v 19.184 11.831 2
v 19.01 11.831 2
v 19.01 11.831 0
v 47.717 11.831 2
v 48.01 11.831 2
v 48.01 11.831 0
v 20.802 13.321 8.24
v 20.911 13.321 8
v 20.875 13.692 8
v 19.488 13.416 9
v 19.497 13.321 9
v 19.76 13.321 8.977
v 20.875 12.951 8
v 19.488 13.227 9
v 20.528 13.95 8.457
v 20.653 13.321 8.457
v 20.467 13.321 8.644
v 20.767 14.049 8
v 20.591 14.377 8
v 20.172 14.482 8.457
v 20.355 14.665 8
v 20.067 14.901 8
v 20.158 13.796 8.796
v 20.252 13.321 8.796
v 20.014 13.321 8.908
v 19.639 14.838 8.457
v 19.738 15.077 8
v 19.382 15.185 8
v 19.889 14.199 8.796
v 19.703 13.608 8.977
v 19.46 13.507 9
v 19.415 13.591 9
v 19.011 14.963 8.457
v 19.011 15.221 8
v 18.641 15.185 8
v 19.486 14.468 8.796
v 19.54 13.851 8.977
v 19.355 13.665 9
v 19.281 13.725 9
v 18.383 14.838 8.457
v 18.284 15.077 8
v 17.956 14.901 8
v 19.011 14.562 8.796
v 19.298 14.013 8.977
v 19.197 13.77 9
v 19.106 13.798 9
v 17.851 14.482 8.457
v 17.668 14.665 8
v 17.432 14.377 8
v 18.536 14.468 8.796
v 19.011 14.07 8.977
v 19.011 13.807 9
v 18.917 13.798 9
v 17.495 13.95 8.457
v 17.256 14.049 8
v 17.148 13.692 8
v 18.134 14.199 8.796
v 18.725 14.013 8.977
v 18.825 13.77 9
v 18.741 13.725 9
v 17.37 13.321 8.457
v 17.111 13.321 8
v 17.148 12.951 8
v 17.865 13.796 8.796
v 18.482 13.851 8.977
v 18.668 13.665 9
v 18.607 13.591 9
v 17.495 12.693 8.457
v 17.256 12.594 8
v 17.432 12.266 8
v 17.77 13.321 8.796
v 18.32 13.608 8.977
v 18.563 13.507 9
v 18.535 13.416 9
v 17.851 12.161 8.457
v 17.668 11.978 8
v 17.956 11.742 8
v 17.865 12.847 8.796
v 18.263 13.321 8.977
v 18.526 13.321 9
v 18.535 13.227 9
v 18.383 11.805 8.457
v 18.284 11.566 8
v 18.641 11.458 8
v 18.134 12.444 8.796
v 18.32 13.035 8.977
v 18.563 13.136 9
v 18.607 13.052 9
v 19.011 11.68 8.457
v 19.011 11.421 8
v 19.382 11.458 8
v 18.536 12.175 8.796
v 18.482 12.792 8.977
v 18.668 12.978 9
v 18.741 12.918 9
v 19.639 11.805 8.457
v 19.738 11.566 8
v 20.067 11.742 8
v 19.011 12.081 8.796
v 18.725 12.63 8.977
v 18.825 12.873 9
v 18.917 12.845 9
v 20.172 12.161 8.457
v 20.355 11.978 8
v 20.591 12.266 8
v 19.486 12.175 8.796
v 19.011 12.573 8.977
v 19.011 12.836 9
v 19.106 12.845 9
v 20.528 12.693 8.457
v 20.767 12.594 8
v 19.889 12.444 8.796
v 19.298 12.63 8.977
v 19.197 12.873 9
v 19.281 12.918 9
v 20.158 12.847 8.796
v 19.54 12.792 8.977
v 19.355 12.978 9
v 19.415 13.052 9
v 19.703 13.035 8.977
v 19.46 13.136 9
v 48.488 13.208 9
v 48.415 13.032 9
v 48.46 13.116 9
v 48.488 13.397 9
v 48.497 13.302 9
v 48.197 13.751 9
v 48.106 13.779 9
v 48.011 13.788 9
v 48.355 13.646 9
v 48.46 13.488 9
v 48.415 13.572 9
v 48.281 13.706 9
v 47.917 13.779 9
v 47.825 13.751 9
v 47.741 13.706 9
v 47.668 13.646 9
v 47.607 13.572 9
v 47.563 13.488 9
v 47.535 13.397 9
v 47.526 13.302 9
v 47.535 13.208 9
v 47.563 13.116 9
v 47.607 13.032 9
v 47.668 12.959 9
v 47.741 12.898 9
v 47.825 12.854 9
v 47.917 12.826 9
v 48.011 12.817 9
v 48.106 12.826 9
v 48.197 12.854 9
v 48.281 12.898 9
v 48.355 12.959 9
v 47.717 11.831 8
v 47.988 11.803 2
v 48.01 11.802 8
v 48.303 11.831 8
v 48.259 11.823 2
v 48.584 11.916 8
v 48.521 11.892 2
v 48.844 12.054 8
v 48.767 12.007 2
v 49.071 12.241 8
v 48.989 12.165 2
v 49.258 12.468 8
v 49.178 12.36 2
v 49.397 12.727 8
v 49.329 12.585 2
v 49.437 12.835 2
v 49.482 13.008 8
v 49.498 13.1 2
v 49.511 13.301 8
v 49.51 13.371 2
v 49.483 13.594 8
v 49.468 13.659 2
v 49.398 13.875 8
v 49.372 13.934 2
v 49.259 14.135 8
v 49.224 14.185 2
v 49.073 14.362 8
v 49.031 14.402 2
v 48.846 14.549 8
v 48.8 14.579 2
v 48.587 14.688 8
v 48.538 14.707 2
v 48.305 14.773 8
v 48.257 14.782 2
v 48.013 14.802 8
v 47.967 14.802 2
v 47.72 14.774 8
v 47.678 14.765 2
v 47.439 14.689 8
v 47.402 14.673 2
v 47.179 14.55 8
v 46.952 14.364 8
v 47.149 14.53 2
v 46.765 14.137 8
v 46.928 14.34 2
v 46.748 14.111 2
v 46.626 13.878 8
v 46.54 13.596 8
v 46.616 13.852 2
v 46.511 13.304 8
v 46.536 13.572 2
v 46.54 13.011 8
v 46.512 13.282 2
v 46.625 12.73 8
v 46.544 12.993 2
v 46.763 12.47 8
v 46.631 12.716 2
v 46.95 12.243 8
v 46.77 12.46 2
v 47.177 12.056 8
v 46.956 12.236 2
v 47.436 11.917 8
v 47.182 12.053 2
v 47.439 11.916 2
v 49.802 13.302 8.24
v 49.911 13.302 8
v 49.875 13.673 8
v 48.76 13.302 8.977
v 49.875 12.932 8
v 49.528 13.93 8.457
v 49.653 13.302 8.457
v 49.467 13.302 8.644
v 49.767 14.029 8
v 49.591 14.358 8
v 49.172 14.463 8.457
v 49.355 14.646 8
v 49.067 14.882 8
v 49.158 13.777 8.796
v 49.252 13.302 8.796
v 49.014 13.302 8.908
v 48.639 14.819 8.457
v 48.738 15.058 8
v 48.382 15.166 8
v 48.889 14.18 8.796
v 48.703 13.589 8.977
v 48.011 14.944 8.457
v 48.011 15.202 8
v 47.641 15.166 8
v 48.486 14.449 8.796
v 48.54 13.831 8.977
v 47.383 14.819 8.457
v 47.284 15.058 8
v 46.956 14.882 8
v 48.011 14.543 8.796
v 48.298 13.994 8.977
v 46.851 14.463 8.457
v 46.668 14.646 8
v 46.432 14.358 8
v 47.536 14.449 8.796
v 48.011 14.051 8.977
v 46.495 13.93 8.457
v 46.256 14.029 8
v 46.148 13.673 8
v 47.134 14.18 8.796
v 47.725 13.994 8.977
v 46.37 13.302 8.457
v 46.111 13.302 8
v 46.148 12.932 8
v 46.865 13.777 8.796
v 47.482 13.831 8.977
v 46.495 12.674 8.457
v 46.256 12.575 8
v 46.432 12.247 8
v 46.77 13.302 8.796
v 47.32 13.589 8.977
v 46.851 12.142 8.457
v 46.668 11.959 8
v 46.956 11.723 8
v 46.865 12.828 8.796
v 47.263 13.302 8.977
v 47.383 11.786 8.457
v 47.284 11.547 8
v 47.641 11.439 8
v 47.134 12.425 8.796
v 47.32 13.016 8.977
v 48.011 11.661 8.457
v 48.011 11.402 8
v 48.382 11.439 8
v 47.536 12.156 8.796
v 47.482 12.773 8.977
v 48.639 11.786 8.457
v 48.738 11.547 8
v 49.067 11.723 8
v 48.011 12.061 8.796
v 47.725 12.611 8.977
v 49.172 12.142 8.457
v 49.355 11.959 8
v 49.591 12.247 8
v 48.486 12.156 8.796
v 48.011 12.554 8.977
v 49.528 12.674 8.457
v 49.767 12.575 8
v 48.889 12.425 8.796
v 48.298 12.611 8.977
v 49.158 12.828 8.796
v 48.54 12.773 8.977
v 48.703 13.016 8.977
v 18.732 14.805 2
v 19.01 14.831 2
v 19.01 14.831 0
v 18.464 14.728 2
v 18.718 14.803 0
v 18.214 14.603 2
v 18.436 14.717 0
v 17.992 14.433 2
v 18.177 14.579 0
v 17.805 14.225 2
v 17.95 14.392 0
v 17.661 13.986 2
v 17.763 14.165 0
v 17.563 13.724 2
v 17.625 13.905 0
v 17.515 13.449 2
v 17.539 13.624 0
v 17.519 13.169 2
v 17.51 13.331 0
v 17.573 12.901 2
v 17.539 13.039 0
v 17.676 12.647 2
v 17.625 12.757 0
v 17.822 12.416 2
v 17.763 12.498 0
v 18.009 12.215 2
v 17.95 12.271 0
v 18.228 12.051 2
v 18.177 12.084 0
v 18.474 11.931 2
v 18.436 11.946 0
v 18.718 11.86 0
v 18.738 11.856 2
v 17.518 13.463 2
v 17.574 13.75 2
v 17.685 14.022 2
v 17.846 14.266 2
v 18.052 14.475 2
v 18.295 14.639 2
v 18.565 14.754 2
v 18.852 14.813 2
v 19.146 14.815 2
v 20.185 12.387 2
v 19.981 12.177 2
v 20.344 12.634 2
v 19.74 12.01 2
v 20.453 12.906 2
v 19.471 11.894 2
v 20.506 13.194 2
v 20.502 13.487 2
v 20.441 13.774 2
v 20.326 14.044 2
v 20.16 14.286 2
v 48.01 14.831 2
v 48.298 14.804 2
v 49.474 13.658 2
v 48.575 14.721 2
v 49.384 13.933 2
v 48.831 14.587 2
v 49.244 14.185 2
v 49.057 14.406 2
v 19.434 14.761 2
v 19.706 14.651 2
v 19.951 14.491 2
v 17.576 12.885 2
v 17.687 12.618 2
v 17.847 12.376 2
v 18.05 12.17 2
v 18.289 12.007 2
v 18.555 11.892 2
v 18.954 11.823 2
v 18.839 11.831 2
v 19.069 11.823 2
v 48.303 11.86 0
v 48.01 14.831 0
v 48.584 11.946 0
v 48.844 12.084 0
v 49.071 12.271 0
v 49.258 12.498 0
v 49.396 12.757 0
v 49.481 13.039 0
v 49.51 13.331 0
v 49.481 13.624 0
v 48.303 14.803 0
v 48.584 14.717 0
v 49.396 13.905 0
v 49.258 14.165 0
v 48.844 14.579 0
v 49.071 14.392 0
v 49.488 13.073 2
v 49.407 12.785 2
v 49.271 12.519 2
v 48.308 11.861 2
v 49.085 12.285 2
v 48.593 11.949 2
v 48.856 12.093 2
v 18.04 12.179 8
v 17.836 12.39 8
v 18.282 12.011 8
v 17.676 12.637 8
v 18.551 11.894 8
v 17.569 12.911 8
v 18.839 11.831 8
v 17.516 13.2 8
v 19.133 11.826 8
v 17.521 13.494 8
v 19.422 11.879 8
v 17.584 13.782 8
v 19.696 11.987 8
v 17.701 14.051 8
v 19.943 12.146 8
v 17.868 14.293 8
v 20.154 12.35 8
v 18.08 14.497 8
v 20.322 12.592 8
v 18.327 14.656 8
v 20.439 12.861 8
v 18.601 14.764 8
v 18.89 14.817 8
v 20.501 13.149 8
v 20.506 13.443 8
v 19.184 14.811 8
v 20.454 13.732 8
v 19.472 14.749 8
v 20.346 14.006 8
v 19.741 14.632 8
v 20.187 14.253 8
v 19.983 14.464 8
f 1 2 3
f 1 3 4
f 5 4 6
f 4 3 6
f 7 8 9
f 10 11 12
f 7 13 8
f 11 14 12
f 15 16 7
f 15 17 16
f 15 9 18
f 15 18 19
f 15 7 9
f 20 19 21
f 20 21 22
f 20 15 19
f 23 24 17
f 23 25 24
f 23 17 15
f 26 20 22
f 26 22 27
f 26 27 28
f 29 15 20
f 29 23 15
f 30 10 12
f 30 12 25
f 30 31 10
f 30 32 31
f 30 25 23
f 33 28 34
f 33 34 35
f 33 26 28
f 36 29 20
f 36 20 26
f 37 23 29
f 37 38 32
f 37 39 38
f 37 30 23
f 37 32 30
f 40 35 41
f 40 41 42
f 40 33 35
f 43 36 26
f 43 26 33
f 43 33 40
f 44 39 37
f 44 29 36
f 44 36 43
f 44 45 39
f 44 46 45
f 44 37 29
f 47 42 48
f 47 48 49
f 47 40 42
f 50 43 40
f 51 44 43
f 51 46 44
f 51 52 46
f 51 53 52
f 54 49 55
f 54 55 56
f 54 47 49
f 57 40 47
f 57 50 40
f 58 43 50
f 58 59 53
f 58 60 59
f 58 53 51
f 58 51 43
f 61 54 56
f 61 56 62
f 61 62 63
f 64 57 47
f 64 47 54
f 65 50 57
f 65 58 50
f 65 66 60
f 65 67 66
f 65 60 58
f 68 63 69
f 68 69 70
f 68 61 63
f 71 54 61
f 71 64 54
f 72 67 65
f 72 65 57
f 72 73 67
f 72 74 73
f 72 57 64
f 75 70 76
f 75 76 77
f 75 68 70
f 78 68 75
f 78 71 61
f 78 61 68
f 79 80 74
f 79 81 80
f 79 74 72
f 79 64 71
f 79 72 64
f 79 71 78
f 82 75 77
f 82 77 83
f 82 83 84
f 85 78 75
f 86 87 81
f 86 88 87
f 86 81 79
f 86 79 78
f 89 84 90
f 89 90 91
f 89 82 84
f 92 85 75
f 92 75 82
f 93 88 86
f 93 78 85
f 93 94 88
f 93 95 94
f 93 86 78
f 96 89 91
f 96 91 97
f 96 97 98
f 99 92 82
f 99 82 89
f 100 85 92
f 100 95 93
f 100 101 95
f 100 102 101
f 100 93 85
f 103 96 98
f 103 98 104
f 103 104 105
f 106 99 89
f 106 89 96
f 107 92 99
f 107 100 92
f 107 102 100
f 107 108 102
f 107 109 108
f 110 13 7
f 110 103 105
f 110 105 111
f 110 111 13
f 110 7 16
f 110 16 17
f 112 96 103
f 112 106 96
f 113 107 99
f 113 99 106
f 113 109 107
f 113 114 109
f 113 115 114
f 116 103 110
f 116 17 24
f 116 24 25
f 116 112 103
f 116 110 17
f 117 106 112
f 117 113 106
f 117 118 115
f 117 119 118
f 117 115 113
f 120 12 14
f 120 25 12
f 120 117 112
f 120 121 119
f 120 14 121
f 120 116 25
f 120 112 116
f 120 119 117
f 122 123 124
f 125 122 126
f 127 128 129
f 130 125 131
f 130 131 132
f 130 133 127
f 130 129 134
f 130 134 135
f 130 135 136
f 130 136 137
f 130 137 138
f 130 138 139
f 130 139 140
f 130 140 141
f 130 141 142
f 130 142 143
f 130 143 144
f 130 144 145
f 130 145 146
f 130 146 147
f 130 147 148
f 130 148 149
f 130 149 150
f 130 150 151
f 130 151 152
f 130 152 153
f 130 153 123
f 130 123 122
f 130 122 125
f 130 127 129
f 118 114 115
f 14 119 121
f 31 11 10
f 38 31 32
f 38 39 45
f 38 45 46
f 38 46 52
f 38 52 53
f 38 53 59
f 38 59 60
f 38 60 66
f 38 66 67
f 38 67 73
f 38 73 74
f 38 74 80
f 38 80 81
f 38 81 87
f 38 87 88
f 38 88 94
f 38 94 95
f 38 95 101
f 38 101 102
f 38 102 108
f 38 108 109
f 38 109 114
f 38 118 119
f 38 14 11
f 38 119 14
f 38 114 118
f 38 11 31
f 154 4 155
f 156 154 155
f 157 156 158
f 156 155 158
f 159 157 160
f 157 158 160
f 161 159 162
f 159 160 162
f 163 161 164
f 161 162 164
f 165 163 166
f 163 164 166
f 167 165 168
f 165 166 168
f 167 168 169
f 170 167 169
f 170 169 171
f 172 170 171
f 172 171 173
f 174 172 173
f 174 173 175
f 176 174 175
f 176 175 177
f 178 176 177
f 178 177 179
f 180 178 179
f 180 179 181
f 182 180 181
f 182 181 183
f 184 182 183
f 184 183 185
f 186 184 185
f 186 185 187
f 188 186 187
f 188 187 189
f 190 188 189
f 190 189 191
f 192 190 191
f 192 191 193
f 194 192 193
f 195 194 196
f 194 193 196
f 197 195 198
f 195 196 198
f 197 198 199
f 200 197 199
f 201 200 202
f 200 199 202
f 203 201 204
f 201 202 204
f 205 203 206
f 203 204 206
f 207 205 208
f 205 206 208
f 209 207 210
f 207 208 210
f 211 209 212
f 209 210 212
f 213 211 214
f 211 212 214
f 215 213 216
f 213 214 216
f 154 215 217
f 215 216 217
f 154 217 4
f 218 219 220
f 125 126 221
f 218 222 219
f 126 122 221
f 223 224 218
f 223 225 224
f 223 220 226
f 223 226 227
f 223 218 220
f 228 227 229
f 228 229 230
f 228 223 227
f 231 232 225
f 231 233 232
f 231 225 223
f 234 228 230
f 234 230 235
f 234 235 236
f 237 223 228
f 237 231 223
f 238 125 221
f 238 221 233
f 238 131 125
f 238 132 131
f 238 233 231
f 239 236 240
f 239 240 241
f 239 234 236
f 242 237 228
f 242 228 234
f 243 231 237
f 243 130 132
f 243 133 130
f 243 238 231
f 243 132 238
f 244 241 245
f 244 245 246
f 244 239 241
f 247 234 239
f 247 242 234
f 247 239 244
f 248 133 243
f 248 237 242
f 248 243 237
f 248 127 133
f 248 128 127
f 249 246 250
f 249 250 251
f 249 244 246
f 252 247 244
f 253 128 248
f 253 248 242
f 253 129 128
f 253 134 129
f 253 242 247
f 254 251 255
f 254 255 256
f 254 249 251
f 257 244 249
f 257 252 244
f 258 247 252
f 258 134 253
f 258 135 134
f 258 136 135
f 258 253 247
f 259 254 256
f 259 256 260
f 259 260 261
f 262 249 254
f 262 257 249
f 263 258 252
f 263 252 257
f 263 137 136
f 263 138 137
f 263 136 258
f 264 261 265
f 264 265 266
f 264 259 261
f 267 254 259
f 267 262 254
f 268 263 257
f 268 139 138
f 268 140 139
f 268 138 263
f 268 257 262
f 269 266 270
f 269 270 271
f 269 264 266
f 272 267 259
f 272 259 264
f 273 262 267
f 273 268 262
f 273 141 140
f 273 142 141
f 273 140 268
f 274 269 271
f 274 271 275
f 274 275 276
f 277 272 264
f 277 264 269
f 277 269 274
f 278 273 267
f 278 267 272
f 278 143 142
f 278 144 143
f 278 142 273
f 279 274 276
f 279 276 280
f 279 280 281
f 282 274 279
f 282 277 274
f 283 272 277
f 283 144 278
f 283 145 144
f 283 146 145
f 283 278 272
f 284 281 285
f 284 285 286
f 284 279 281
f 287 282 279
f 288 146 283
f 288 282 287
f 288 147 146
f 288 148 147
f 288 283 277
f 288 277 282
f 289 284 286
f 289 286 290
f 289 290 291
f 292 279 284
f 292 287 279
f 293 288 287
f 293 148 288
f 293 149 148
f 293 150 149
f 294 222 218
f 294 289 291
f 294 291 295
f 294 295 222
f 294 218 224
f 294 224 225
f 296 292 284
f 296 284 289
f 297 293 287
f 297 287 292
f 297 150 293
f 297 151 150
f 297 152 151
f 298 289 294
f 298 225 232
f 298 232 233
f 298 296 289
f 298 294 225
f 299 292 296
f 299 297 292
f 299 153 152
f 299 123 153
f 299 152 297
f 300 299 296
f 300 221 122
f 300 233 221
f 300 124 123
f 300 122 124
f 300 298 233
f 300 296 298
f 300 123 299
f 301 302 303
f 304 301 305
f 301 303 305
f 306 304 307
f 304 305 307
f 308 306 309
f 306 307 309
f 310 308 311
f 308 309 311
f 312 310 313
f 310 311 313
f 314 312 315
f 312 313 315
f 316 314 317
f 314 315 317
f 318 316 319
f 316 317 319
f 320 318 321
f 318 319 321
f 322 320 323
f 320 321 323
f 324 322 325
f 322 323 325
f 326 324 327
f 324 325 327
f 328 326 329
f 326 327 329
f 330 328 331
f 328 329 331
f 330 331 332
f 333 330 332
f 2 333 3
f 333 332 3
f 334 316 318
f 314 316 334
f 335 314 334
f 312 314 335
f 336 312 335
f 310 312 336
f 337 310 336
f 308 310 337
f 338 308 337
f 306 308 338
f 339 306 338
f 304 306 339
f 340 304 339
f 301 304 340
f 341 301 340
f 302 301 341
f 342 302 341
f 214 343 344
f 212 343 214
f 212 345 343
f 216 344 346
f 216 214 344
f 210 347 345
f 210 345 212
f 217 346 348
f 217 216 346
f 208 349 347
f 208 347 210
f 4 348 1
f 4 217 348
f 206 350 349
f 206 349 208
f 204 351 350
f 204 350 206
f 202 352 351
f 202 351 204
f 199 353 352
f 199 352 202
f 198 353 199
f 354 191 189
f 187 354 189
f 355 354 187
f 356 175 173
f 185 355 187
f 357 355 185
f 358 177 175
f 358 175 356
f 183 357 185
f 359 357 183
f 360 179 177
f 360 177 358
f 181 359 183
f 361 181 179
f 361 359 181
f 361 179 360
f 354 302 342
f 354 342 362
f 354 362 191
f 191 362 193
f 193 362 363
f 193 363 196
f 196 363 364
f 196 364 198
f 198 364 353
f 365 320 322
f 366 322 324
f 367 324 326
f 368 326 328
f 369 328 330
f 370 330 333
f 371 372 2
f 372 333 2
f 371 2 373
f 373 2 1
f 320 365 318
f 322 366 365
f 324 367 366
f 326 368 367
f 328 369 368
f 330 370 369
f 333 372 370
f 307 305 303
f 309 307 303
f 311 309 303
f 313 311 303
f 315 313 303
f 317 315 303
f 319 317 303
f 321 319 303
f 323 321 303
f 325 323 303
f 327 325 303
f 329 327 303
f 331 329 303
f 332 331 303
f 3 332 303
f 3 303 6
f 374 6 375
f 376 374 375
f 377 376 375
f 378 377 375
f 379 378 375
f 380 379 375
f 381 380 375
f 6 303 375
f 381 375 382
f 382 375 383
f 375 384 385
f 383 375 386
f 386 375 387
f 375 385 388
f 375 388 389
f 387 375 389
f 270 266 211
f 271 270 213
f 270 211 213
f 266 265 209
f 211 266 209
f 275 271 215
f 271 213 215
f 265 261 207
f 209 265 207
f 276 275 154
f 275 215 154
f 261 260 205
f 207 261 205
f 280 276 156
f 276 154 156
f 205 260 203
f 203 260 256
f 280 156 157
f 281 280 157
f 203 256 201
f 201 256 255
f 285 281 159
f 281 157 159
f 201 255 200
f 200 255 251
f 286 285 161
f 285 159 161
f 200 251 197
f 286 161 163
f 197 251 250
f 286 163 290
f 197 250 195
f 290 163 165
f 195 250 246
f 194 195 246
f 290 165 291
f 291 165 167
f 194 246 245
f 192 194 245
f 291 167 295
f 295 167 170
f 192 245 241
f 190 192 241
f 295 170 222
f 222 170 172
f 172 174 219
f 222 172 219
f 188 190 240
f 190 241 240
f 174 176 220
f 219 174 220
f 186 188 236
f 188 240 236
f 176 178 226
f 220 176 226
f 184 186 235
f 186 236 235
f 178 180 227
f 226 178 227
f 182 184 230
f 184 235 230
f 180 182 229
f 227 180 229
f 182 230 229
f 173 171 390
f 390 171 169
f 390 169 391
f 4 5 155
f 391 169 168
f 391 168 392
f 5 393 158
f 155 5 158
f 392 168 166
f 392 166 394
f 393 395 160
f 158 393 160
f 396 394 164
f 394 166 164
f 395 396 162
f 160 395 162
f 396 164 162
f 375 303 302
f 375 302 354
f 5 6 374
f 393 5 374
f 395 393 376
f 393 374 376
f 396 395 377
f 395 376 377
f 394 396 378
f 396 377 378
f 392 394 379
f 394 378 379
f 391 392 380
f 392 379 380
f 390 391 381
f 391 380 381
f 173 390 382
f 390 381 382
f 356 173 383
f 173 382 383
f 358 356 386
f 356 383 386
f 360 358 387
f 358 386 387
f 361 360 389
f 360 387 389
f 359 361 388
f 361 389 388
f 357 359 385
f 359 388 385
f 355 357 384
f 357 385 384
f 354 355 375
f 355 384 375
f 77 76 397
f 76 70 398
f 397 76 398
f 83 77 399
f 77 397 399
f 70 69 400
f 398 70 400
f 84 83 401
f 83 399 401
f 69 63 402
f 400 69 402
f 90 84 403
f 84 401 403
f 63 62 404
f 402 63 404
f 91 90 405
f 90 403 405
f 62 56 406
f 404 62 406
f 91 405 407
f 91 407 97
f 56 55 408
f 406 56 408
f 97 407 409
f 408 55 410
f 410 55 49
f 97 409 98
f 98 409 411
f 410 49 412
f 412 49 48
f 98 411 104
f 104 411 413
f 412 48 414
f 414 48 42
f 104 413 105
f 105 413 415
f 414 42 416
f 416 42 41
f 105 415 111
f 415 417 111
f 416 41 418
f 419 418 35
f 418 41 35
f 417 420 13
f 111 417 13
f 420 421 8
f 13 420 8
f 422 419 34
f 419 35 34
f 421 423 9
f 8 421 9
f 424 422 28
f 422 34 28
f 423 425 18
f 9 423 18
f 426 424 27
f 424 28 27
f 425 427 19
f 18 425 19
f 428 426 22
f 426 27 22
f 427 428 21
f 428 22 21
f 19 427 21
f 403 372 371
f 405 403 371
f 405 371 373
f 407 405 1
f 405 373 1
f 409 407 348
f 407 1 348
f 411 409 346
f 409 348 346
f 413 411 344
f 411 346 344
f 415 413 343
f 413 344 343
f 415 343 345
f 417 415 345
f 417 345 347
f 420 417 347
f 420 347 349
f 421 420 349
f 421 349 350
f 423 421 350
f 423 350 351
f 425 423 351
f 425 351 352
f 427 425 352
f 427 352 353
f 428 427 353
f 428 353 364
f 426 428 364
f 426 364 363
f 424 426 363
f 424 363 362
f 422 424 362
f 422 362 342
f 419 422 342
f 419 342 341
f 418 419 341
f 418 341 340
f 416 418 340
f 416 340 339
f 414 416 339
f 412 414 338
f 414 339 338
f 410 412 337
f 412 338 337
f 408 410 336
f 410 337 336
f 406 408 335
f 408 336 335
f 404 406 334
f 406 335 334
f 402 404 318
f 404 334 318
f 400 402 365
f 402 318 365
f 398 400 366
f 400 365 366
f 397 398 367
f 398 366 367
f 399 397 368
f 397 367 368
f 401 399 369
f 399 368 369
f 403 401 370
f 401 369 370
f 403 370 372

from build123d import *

# Parameters (mm, degrees)
ESQUISSE1_W        = 32
ESQUISSE1_H        = 3
BOSS_EXTRU_2_DEPTH = 2
ESQUISSE4_R        = 1.5
BOSS_EXTRU_3_DEPTH = 6
ESQUISSE5_R        = 1.9
BOSS_EXTRU_4_DEPTH = 1
CONG_13_R          = 1.5
CONG_14_R          = 1.5
CONG_16_R          = 1.5
CONG_17_R          = 1.5


with BuildPart() as part:
    # Esquisse1 → Boss.-Extru.2 (new body)
    with BuildSketch(Plane(origin=(-13.705479482, 0.648434545, 0), x_dir=(1, 0, 0), z_dir=(0, 0, 1))):
        with Locations((47.215800187, 12.683032093)):
            Rectangle(ESQUISSE1_W, ESQUISSE1_H)
    extrude(amount=BOSS_EXTRU_2_DEPTH)

    # Esquisse4 → Boss.-Extru.3 (add)
    with BuildSketch(Plane(origin=(-13.705479482, 4.052004393, 2), x_dir=(1, 0, 0), z_dir=(0, 0, 1))):
        with Locations(Location((32.71685212, 9.269475593, 0), (0, 0, 263.384796373))):
            Circle(ESQUISSE4_R)
        with Locations(Location((61.71685212, 9.250376763, 0), (0, 0, 258.698543871))):
            Circle(ESQUISSE4_R)
    extrude(amount=BOSS_EXTRU_3_DEPTH)

    # Esquisse5 → Boss.-Extru.4 (add)
    with BuildSketch(Plane(origin=(-13.705479482, 4.052004393, 8), x_dir=(1, 0, 0), z_dir=(0, 0, 1))):
        with Locations((32.71685212, 9.269475593)):
            Circle(ESQUISSE5_R)
        with Locations((61.71685212, 9.250376763)):
            Circle(ESQUISSE5_R)
    extrude(amount=BOSS_EXTRU_4_DEPTH)

    # Congé13
    # the kernel refuses this fillet: 1.5 mm, written as the material it takes off along each edge
    with BuildSketch(Plane(origin=(49.510320705, 14.831466639, -3.75), x_dir=(0, -1, 0), z_dir=(0, 0, 1)), Plane(origin=(49.510320705, 11.831466639, -3.75), x_dir=(-1, 0, 0), z_dir=(0, 0, 1))) as cong_13_piece_1:
        with BuildLine():
            CenterArc((CONG_13_R, -CONG_13_R), CONG_13_R, 90, 90)
            Line((0, -CONG_13_R), (0, 0))
            Line((0, 0), (CONG_13_R, 0))
        make_face()
    extrude(amount=5.75, mode=Mode.SUBTRACT)

    # Congé14
    # the kernel refuses this fillet: 1.5 mm, written as the material it takes off along each edge
    with BuildSketch(Plane(origin=(17.510320705, 11.831466639, -3.75), x_dir=(0, 1, 0), z_dir=(0, 0, 1))) as cong_14_piece_1:
        with BuildLine():
            CenterArc((CONG_14_R, -CONG_14_R), CONG_14_R, 90, 90)
            Line((0, -CONG_14_R), (0, 0))
            Line((0, 0), (CONG_14_R, 0))
        make_face()
    extrude(amount=5.75, mode=Mode.SUBTRACT)
    with BuildSketch(Plane(origin=(17.510320705, 14.831466639, -3.75), x_dir=(0, -1, 0), z_dir=(0, 0, 1))) as cong_14_piece_2:
        with BuildLine():
            CenterArc((CONG_14_R, CONG_14_R), CONG_14_R, 180, 90)
            Line((0, CONG_14_R), (0, 0))
            Line((0, 0), (CONG_14_R, 0))
        make_face()
    extrude(amount=9.5, mode=Mode.SUBTRACT)

    # Congé16
    # the kernel refuses this fillet: 1.5 mm, written as the material it takes off along each edge
    with BuildSketch(Plane(origin=(48.011372638, 13.302381156, 9), x_dir=(1, 0, 0), z_dir=(0, -1, 0))) as cong_16_piece_1:
        with BuildLine():
            CenterArc((0.485786438, -1.5), CONG_16_R, 19.471220634, 70.528779366)
            Line((0.485786438, 0), (0.485786438, 0.03))
            Line((0.485786438, 0.03), (1.9, 0.03))
            Line((1.9, 0.03), (1.93, 0))
            ThreePointArc((1.93, 0), (1.93, -0.5), (1.928284271, -0.99))
            Line((1.928284271, -0.99), (1.9, -1))
        make_face()
    revolve(axis=Axis((48.011372638, 13.302381156, 9), (0, 0, 1)), mode=Mode.SUBTRACT)

    # Congé17
    # the kernel refuses this fillet: 1.5 mm, written as the material it takes off along each edge
    with BuildSketch(Plane(origin=(19.011372638, 13.321479986, 9), x_dir=(1, 0, 0), z_dir=(0, -1, 0))) as cong_17_piece_1:
        with BuildLine():
            CenterArc((0.485786438, -1.5), CONG_17_R, 19.471220634, 70.528779366)
            Line((0.485786438, 0), (0.485786438, 0.03))
            Line((0.485786438, 0.03), (1.9, 0.03))
            Line((1.9, 0.03), (1.93, 0))
            ThreePointArc((1.93, 0), (1.93, -0.5), (1.928284271, -0.99))
            Line((1.928284271, -0.99), (1.9, -1))
        make_face()
    revolve(axis=Axis((19.011372638, 13.321479986, 9), (0, 0, 1)), mode=Mode.SUBTRACT)


solid = part.part
